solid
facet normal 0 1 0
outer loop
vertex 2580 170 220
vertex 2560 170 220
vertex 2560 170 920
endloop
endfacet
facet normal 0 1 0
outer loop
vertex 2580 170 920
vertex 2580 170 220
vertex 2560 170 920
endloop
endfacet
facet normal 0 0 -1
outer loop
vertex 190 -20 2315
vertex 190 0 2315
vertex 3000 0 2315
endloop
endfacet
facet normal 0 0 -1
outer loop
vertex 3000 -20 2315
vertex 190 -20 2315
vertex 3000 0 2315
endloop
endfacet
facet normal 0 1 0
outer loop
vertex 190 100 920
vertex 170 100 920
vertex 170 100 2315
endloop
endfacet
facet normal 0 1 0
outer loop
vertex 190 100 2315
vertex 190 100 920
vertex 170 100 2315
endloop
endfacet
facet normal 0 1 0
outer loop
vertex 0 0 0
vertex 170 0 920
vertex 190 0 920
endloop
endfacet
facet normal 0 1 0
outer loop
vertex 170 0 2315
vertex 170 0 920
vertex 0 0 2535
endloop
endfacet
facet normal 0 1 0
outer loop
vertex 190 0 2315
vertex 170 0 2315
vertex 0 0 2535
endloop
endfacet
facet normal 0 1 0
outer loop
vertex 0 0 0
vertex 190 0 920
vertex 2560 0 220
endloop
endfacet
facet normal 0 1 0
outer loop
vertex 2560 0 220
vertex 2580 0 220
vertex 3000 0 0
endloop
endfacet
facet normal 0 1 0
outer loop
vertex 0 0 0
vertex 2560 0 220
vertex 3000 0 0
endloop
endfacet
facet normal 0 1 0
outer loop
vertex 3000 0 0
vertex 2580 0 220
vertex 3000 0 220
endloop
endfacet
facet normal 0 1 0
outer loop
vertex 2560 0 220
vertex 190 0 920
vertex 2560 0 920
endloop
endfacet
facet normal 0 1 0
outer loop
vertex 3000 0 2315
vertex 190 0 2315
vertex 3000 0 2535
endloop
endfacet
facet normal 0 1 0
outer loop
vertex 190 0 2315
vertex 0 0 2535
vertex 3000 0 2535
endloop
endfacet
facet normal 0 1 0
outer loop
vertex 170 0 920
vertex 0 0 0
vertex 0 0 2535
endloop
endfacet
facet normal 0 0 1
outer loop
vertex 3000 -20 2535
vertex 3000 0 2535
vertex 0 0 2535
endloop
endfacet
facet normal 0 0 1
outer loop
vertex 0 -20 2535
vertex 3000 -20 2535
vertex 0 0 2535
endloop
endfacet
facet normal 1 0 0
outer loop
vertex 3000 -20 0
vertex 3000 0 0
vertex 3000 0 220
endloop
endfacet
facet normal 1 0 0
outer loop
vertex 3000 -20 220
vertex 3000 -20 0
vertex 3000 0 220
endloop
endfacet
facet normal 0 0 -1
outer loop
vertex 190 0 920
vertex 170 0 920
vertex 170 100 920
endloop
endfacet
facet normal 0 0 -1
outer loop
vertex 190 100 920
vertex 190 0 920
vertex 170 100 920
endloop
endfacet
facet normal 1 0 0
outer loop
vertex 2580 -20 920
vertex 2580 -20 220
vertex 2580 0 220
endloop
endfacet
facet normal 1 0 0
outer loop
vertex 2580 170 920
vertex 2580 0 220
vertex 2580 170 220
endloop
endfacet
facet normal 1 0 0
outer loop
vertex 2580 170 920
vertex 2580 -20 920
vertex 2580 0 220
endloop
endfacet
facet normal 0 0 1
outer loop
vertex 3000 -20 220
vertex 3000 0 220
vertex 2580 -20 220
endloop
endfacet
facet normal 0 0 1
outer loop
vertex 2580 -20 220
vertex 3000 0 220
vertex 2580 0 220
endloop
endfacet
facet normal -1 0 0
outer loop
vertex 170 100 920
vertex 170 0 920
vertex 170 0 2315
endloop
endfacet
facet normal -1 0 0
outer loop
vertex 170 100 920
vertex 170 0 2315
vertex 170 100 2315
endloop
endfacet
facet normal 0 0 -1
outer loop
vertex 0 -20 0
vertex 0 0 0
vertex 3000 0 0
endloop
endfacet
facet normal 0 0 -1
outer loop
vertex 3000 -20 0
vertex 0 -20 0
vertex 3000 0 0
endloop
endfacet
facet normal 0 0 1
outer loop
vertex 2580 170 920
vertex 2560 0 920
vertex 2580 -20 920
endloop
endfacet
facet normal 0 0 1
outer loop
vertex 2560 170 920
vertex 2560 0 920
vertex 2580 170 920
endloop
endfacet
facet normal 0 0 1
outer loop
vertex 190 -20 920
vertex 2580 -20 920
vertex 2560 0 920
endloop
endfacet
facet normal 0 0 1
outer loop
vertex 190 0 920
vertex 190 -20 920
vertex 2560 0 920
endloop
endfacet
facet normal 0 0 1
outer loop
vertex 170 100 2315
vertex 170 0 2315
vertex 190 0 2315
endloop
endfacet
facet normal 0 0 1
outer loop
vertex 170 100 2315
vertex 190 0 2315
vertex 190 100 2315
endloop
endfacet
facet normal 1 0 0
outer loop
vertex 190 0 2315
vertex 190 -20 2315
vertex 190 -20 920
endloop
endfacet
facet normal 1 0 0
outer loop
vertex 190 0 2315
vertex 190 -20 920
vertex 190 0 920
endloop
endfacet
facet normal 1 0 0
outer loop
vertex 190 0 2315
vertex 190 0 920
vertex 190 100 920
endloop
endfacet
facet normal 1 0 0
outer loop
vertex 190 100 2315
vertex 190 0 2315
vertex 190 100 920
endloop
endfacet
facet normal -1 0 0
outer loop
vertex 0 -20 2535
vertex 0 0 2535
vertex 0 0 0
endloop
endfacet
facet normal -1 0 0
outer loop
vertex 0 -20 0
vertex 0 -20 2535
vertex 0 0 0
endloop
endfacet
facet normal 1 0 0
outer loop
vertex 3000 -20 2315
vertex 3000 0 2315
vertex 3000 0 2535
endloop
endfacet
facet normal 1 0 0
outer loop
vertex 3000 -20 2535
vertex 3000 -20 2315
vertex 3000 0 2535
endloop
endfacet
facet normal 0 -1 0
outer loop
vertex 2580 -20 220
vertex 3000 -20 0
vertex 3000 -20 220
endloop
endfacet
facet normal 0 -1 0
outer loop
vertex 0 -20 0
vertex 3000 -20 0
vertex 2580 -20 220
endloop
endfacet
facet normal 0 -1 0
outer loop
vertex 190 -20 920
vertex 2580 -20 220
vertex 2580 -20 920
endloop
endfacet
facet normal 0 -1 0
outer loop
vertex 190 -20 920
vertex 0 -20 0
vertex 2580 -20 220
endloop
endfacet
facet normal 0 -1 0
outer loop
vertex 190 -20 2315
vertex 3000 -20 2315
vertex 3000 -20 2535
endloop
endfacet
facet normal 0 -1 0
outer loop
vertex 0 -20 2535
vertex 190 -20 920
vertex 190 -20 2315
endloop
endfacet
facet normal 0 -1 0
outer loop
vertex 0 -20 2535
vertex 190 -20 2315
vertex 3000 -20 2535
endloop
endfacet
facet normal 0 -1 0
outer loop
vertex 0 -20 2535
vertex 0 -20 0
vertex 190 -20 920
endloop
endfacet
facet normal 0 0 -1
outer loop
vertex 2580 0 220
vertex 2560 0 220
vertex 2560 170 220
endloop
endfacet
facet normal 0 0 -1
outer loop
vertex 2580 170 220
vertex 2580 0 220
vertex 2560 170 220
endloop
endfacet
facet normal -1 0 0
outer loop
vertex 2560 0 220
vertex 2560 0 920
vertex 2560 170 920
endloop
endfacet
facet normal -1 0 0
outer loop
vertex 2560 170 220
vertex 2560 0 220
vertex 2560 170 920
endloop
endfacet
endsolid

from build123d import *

# Parameters (mm, degrees)
F1_DEPTH = 20
F2_W     = 190
F2_H     = 700
F3_DEPTH = 20
F4_W     = 120
F4_H     = 1395
F5_DEPTH = 20


with BuildPart() as f1:
    # F0 (on Front) → F1 (new body)
    with BuildSketch(Plane.XZ):
        Polygon((0, 920), (0, 0), (2560, 0), (3000, 0), (3000, 220), (2560, 220), (2560, 920), (170, 920), (170, 2315), (3000, 2315), (3000, 2535), (0, 2535), (0, 2320), align=None)
    extrude(amount=F1_DEPTH)

    # F2 (on face) → F3 (join)
    with BuildSketch(Plane.YZ.offset(2560)):
        with Locations((75, 570)):
            Rectangle(F2_W, F2_H)
    extrude(amount=F3_DEPTH)

    # F4 (on face) → F5 (join)
    with BuildSketch(Plane.YZ.offset(170)):
        with Locations((40, 1617.5)):
            Rectangle(F4_W, F4_H)
    extrude(amount=F5_DEPTH)


solid = f1.part
